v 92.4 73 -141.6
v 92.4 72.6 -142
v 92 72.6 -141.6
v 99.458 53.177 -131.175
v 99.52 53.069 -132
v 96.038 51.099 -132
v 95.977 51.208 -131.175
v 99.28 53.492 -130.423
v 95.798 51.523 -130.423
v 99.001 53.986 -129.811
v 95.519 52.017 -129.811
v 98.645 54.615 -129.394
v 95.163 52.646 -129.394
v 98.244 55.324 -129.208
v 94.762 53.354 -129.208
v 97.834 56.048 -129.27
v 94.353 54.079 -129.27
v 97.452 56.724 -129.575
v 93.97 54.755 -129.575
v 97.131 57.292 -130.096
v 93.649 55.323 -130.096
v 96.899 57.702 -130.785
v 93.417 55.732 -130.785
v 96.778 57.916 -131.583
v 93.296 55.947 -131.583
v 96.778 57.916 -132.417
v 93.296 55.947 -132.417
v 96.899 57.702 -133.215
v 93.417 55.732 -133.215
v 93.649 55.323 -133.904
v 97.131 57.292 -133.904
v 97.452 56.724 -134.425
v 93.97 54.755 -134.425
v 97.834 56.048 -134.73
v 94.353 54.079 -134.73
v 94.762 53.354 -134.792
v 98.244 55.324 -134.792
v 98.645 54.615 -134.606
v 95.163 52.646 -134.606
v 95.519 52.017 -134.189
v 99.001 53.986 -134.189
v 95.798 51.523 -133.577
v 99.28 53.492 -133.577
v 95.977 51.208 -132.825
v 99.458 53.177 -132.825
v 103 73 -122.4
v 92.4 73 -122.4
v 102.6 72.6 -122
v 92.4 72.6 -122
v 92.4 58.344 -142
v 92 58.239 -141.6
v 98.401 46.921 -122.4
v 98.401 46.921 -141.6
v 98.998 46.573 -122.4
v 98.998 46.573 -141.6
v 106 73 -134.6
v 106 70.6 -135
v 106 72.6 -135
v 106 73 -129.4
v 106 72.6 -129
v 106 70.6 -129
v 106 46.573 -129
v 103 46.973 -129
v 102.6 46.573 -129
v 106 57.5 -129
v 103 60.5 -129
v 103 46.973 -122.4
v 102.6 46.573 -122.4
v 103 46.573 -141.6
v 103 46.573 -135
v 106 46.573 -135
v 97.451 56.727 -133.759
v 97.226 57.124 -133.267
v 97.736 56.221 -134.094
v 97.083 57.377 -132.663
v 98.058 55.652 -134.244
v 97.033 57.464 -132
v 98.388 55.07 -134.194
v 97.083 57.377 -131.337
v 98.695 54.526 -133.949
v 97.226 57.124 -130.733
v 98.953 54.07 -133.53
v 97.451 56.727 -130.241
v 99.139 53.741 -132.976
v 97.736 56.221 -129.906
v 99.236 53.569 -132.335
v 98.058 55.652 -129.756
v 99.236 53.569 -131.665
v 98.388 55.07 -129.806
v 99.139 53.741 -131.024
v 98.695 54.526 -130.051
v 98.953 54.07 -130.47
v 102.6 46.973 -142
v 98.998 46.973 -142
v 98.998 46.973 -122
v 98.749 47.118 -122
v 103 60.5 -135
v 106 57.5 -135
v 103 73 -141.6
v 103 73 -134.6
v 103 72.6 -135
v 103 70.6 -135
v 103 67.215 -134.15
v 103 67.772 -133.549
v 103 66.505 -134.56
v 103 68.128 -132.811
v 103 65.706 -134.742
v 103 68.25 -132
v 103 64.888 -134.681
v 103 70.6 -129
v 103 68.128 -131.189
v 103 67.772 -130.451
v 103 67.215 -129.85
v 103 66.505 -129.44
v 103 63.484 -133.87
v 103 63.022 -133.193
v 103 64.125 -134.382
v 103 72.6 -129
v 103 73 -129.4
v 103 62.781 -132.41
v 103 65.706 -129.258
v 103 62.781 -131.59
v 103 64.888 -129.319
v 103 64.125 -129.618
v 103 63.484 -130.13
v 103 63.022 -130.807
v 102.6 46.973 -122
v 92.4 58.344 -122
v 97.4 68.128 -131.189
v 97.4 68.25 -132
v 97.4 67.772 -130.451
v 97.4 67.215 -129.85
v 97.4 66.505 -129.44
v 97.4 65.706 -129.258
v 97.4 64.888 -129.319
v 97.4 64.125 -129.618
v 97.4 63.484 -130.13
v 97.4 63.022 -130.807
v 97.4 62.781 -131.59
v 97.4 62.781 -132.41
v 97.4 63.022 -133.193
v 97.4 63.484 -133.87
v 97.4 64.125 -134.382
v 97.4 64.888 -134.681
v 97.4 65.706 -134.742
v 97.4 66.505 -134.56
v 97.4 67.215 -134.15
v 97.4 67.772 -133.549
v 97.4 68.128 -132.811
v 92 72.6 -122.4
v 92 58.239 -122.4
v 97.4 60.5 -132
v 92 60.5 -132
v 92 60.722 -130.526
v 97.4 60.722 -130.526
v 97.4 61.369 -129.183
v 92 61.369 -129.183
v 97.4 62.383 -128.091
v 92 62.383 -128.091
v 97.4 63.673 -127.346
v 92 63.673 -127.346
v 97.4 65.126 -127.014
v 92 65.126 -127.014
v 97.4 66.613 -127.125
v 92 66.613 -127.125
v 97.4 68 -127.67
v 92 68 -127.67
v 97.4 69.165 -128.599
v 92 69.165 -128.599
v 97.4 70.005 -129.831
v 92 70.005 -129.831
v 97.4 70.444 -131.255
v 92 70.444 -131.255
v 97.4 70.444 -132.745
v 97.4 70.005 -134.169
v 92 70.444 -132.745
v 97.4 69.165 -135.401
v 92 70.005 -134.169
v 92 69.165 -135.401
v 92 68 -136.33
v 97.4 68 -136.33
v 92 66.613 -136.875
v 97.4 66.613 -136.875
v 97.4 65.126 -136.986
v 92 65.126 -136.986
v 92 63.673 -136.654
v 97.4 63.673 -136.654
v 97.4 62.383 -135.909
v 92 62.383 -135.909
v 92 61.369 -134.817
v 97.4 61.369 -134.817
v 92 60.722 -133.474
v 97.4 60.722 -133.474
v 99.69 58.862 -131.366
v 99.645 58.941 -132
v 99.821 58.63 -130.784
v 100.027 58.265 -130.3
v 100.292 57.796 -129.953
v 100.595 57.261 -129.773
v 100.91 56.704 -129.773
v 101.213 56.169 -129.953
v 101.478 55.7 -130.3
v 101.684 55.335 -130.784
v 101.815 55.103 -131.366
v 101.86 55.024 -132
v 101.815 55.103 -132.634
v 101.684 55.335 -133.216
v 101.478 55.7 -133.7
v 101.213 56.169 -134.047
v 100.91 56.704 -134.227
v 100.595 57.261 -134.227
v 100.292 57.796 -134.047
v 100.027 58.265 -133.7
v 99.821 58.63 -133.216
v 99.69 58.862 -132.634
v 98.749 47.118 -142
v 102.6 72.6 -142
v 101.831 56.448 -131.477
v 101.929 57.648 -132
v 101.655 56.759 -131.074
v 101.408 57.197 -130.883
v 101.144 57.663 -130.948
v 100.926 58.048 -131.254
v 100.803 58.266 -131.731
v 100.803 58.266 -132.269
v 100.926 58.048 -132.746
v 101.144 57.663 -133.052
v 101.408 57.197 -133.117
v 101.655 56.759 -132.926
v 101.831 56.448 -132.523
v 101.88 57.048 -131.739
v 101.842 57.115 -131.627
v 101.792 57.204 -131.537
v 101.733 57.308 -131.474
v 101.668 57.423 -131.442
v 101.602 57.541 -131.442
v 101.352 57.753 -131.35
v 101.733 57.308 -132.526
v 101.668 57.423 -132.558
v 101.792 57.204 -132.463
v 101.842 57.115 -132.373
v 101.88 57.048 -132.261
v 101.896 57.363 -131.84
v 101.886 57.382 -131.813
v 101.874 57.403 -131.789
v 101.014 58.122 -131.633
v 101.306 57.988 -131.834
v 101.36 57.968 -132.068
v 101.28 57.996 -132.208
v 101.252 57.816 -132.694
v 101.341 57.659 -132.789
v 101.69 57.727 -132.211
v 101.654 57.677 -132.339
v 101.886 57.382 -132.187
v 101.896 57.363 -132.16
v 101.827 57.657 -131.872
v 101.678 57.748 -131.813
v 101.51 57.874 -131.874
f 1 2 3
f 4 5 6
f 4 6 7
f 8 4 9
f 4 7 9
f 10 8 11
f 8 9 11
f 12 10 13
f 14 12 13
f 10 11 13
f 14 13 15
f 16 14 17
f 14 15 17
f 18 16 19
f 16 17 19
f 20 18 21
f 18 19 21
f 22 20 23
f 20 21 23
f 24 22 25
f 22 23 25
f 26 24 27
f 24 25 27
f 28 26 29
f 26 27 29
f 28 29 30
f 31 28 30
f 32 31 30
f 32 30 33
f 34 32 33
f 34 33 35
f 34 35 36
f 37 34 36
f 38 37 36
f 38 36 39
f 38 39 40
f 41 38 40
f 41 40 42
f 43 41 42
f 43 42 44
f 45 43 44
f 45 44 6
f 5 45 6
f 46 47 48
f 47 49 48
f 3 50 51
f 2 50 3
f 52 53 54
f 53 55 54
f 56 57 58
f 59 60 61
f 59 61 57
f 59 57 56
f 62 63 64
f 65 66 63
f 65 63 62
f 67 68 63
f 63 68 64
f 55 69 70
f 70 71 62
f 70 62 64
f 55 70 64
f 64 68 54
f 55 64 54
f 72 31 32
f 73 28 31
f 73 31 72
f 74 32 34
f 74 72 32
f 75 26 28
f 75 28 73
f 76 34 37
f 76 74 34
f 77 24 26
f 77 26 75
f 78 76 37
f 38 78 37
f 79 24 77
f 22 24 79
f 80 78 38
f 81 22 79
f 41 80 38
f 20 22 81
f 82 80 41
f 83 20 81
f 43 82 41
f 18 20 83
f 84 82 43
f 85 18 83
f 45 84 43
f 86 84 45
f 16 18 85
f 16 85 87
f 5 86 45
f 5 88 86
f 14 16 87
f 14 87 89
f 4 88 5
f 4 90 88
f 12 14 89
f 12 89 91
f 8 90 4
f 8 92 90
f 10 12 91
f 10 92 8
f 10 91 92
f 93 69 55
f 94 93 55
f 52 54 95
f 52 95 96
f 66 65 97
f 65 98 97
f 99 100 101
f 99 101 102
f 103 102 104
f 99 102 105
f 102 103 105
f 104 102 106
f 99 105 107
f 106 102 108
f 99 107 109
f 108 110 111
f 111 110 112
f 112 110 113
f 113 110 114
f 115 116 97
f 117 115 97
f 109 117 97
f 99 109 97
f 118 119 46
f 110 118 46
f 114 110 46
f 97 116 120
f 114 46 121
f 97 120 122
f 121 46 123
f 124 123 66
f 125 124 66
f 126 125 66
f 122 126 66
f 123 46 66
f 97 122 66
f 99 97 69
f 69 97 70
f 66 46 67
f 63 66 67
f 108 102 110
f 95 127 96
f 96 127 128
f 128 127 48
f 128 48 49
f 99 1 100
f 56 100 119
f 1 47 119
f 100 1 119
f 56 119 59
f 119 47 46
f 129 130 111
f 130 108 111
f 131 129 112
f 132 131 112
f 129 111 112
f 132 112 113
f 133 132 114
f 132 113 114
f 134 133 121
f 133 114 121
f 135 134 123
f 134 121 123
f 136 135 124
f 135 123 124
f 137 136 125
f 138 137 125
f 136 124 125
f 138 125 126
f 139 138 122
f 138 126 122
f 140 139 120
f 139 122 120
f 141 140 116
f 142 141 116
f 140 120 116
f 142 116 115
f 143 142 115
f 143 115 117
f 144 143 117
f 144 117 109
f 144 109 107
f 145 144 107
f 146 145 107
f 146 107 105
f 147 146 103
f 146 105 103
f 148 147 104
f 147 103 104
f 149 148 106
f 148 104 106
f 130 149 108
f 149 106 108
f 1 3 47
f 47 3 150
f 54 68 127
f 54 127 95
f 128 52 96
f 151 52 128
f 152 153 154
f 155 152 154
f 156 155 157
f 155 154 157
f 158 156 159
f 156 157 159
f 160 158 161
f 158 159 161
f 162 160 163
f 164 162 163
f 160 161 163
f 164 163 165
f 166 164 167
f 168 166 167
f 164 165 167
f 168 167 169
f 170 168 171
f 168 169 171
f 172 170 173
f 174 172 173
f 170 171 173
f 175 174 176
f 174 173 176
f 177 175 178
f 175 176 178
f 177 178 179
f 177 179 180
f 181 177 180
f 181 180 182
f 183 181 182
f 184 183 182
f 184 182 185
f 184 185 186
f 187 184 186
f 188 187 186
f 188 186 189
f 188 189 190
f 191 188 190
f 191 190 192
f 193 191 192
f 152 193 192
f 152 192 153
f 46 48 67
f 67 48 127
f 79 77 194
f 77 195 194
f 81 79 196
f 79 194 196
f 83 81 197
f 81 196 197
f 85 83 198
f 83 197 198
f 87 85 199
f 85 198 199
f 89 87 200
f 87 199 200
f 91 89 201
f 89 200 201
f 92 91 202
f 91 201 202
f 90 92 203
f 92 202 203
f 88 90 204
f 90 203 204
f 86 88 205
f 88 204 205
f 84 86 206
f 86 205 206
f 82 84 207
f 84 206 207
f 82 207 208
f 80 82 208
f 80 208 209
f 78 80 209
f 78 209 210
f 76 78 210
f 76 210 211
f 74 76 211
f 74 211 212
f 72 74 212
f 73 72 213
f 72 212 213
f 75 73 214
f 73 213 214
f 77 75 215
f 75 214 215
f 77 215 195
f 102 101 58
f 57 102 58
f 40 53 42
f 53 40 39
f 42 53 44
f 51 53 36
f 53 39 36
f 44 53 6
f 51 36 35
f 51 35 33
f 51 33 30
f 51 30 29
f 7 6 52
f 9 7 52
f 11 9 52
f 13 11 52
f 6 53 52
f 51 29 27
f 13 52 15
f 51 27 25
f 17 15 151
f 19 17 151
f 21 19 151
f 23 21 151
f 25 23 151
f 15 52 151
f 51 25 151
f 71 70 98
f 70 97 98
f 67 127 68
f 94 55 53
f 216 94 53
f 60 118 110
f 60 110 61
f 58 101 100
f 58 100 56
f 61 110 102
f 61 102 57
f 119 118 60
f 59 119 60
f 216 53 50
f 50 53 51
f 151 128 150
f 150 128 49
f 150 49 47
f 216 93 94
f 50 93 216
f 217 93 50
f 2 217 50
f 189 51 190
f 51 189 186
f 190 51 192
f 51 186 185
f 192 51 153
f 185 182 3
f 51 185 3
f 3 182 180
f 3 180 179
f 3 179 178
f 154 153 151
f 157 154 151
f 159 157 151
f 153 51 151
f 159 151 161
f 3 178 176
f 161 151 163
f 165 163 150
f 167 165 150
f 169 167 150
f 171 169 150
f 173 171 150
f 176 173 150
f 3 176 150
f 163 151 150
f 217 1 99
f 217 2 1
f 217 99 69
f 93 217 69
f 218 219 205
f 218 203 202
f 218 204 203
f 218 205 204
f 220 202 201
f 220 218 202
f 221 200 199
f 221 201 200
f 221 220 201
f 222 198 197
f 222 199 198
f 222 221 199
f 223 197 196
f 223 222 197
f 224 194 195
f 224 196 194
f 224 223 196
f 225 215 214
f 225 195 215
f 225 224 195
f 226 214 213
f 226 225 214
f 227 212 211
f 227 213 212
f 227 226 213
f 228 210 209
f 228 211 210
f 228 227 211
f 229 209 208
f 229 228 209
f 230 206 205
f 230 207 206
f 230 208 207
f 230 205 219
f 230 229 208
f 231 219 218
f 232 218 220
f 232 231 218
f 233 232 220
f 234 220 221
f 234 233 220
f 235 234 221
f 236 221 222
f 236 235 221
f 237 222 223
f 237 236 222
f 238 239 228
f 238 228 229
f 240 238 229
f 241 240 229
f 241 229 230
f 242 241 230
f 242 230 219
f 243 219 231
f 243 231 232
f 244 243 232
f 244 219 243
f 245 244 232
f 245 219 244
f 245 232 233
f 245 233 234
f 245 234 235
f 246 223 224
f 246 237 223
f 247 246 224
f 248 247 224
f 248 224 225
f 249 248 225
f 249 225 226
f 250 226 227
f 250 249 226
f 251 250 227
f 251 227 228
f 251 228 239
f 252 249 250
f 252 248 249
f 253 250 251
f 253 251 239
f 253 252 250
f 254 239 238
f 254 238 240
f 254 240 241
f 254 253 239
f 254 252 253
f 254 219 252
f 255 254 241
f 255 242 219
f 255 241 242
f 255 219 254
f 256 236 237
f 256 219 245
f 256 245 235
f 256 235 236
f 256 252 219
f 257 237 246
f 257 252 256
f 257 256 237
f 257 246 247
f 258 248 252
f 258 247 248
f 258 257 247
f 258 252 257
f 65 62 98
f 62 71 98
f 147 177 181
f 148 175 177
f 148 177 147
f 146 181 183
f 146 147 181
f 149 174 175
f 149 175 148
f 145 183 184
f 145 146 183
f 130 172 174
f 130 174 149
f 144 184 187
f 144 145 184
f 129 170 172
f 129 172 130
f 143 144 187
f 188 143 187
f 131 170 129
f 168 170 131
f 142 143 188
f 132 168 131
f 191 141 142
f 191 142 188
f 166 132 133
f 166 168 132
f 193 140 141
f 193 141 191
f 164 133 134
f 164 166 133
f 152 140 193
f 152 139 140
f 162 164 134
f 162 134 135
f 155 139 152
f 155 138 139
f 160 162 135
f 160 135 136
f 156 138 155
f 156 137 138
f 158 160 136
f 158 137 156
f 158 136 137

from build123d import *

# Parameters (mm, degrees)
PAD097_DEPTH        = 10
SKETCH351_W         = 3
SKETCH351_H         = 2.4
PAD098_DEPTH        = 3
HOLE_D              = 5.5
HOLE_CBORE_D        = 10
HOLE_CBORE_DEPTH    = 5.4
HOLE041_D           = 4.5
HOLE041_DEPTH       = 7
HOLE041_CBORE_D     = 5.6
HOLE041_CBORE_DEPTH = 4
HOLE041_TIPS_R      = 2.25
CHAMFER006_SIZE     = 0.4


with BuildPart() as part:
    # Sketch350 → Pad097 (new body, symmetric)
    with BuildSketch(Plane.XY):
        Polygon((92, 73), (103, 73), (103, 46.573101), (98.597712, 46.573101), (92, 58.23869), align=None)
    extrude(amount=PAD097_DEPTH, both=True)

    # Sketch351 → Pad098 (join, symmetric)
    with BuildSketch(Plane.XY):
        Polygon((103, 46.573101), (106, 46.573101), (106, 57.5), (103, 60.5), align=None)
        with Locations((104.5, 71.8)):
            Rectangle(SKETCH351_W, SKETCH351_H)
    extrude(amount=PAD098_DEPTH, both=True)

    # Hole (through all)
    with Locations(Plane(origin=(92, 0, 0), x_dir=(0, -1, 0), z_dir=(-1, 0, 0))):
        with Locations((-65.5, 0)):
            CounterBoreHole(HOLE_D / 2, HOLE_CBORE_D / 2, HOLE_CBORE_DEPTH)

    # Hole041
    with Locations(Plane(origin=(94.659391, 53.536551, 0), x_dir=(0.49229, -0.870431, 0), z_dir=(-0.870431, -0.49229, 0))):
        with Locations((0, 0)):
            CounterBoreHole(HOLE041_D / 2, HOLE041_CBORE_D / 2, HOLE041_CBORE_DEPTH, depth=HOLE041_DEPTH)

    # Hole041 tips → Hole041 tip 1 section 0
    with BuildSketch(Plane(origin=(100.752409, 56.982581, 0), x_dir=(0.49229, -0.870431, 0), z_dir=(-0.870431, -0.49229, 0)), mode=Mode.PRIVATE) as hole041_tip_1_s0:
        Circle(HOLE041_TIPS_R)
    loft([hole041_tip_1_s0.sketch, Vertex(101.929177, 57.648126, 0)], mode=Mode.SUBTRACT)

    # Chamfer006
    chamfer006_edges = [part.edges().sort_by_distance(p)[0] for p in [
        (97.5, 73, 10),
        (103, 59.786551, 10),
        (100.798856, 46.573101, 10),
        (95.298856, 52.405895, 10),
        (92, 65.619345, 10),
        (98.597712, 46.573101, 0),
        (97.5, 73, -10),
        (103, 59.786551, -10),
        (100.798856, 46.573101, -10),
        (95.298856, 52.405895, -10),
        (92, 65.619345, -10),
        (92, 73, 0),
        (103, 46.573101, 6.5),
        (104.5, 73, 3),
        (104.5, 73, -3),
    ]]
    chamfer(chamfer006_edges, length=CHAMFER006_SIZE)


with BuildPart() as part_1:
    # Body022073 placement: moved
    add(part.part.moved(Location((0, 0, -132))))


solid = part_1.part
